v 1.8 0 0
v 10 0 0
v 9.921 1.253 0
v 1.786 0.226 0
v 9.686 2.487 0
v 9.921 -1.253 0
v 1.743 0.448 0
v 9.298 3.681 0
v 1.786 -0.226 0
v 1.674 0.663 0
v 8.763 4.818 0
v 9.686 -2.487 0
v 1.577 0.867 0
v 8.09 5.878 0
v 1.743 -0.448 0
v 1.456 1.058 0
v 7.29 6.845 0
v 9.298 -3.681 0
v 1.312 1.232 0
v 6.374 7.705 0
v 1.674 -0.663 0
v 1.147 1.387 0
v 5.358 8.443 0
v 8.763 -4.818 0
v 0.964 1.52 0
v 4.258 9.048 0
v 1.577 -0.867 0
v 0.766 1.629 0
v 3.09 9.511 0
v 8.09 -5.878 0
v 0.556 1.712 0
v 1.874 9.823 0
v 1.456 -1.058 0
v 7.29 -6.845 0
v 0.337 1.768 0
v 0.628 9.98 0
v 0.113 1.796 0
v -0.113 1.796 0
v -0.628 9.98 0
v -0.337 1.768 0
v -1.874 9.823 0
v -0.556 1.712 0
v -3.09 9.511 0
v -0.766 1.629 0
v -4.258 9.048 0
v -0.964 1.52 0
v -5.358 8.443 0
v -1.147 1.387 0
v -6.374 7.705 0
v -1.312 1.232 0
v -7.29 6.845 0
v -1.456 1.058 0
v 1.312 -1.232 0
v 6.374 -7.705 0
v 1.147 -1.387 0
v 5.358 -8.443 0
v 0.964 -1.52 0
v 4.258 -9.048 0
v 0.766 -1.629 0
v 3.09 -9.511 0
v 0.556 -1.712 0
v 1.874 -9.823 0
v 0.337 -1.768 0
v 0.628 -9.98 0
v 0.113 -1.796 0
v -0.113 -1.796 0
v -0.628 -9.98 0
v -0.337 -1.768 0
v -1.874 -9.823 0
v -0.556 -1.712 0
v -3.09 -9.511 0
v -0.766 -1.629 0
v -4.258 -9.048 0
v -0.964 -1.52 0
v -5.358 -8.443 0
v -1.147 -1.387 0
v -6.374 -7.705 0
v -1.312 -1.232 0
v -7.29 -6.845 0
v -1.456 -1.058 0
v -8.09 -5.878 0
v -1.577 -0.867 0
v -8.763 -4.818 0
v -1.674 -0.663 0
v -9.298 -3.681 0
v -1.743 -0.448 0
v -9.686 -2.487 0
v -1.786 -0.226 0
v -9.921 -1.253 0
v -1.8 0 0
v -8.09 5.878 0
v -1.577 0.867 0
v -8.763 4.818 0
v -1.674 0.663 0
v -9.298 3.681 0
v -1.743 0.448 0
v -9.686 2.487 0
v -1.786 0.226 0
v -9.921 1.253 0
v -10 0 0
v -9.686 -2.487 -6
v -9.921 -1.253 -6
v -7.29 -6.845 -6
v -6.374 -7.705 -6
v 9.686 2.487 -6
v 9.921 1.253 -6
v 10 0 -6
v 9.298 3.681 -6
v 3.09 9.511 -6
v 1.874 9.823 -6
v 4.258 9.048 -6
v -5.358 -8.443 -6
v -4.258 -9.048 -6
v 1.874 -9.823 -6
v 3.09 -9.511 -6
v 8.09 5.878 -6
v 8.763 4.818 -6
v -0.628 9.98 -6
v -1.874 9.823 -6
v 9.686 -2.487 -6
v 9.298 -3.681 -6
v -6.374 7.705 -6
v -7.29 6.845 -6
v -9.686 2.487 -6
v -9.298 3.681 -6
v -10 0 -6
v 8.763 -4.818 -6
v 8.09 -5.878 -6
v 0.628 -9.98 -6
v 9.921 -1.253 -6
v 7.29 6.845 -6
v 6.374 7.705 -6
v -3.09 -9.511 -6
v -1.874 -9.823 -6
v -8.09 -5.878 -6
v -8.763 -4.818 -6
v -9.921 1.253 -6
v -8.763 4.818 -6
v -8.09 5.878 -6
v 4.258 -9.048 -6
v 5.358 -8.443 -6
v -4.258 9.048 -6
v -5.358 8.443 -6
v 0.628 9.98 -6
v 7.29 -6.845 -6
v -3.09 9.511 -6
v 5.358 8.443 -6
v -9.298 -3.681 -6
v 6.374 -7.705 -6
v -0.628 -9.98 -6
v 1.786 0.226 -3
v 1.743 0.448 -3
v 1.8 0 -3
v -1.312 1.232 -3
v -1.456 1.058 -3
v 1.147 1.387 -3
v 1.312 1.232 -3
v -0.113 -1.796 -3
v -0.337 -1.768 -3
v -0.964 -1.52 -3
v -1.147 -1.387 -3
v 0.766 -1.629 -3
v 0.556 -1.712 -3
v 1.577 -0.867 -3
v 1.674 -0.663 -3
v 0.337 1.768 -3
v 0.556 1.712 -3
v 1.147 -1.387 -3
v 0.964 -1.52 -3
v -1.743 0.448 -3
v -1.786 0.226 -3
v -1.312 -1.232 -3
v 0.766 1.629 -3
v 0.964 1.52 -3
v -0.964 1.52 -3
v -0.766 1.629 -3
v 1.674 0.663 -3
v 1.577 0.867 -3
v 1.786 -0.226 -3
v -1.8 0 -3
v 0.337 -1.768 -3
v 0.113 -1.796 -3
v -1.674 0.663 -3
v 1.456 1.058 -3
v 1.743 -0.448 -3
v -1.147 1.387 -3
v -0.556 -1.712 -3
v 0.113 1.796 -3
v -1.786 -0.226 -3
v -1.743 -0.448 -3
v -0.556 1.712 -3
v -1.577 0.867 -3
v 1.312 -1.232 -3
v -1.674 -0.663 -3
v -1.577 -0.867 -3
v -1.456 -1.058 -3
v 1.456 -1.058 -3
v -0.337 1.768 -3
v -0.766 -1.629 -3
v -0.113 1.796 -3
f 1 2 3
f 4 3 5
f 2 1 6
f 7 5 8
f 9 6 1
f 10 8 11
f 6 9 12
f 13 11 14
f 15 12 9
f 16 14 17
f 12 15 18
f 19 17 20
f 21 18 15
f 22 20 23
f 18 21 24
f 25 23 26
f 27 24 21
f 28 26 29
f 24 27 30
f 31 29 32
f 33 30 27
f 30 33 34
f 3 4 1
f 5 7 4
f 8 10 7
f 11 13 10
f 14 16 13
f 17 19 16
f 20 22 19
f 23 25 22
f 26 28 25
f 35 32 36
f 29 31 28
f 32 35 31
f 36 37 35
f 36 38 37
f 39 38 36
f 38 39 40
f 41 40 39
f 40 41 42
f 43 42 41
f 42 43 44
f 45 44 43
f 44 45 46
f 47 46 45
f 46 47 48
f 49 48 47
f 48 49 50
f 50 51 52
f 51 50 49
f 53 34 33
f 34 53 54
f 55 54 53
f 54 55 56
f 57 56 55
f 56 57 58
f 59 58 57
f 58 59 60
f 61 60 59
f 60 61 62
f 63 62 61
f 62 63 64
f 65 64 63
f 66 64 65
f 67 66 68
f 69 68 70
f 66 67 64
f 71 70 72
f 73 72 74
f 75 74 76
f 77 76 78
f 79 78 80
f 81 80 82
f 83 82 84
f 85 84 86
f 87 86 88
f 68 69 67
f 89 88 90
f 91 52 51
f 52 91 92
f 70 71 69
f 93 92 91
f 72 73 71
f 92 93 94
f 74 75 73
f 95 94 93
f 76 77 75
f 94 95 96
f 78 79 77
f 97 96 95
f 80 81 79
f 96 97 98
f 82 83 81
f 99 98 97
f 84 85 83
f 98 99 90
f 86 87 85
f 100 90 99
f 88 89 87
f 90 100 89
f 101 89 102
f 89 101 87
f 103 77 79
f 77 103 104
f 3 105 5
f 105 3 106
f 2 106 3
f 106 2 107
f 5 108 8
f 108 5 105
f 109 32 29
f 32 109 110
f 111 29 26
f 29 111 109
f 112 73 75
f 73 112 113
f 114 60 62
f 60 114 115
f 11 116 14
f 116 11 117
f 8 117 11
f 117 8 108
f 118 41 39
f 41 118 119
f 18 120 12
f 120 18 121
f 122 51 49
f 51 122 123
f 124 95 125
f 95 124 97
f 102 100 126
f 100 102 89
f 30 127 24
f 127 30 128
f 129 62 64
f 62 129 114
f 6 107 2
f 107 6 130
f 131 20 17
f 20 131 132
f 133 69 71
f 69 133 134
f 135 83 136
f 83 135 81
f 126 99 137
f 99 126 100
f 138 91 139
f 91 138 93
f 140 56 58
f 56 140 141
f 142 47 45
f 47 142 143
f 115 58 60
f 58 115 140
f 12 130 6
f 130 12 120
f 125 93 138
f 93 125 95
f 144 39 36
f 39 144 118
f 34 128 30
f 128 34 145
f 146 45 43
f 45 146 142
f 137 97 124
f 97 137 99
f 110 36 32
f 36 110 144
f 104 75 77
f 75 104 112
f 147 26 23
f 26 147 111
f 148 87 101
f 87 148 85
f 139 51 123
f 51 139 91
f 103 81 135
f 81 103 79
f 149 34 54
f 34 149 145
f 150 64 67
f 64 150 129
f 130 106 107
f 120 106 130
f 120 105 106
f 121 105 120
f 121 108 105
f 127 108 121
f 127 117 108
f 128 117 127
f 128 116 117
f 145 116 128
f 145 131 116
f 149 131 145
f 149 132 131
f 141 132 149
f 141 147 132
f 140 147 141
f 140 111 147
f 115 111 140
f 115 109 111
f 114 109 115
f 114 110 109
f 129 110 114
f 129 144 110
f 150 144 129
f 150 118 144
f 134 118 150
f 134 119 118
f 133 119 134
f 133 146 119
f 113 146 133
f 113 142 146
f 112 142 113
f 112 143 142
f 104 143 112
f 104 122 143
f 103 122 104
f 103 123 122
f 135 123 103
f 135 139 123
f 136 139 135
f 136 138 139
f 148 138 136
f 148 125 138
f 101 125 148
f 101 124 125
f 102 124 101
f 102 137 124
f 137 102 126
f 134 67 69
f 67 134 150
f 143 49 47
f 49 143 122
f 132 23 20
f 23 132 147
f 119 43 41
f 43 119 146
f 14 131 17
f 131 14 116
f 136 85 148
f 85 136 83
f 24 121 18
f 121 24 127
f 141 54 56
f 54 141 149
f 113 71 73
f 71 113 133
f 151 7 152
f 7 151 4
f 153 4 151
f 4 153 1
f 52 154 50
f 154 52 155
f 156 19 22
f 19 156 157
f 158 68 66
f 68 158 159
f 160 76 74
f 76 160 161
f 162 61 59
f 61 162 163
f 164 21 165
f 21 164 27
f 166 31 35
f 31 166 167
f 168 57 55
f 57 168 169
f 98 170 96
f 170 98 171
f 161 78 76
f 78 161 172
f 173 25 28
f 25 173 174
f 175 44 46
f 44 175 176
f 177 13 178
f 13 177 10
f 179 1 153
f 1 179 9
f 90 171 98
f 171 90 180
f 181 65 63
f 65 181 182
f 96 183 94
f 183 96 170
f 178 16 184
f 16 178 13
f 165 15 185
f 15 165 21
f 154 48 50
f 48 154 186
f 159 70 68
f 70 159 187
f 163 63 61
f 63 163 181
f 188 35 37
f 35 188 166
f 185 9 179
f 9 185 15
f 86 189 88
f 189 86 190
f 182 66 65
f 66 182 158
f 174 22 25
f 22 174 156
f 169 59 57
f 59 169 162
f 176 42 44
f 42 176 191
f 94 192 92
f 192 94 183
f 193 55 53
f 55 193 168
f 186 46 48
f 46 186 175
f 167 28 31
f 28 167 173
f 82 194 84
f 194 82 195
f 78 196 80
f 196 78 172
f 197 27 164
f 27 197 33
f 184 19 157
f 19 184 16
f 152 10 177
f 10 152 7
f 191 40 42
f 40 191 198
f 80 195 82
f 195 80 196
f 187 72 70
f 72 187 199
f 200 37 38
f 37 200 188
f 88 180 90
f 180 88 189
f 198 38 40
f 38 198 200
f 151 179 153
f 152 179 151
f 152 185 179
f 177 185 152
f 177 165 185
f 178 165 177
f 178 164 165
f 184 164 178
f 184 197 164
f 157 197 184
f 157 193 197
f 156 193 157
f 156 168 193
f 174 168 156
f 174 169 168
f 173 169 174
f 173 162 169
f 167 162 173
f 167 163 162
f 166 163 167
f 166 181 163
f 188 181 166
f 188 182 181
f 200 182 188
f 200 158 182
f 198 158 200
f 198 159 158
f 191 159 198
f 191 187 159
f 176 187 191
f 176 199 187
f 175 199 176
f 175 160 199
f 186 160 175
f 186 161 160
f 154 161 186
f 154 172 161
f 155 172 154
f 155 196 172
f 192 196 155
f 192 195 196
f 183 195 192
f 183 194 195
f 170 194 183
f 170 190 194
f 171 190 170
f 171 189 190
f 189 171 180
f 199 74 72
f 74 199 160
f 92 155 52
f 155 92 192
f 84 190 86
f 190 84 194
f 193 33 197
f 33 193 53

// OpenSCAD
$fn = 50;


difference() {
	union() {
		translate(v = [0, 0, -3.0000000000]) {
			cylinder(h = 3, r = 7.0000000000);
		}
		translate(v = [0, 0, -6.0000000000]) {
			cylinder(h = 6, r = 10.0000000000);
		}
	}
	union() {
		#translate(v = [0, 0, -3]) {
			cylinder(h = 3, r = 1.8000000000);
		}
	}
}
